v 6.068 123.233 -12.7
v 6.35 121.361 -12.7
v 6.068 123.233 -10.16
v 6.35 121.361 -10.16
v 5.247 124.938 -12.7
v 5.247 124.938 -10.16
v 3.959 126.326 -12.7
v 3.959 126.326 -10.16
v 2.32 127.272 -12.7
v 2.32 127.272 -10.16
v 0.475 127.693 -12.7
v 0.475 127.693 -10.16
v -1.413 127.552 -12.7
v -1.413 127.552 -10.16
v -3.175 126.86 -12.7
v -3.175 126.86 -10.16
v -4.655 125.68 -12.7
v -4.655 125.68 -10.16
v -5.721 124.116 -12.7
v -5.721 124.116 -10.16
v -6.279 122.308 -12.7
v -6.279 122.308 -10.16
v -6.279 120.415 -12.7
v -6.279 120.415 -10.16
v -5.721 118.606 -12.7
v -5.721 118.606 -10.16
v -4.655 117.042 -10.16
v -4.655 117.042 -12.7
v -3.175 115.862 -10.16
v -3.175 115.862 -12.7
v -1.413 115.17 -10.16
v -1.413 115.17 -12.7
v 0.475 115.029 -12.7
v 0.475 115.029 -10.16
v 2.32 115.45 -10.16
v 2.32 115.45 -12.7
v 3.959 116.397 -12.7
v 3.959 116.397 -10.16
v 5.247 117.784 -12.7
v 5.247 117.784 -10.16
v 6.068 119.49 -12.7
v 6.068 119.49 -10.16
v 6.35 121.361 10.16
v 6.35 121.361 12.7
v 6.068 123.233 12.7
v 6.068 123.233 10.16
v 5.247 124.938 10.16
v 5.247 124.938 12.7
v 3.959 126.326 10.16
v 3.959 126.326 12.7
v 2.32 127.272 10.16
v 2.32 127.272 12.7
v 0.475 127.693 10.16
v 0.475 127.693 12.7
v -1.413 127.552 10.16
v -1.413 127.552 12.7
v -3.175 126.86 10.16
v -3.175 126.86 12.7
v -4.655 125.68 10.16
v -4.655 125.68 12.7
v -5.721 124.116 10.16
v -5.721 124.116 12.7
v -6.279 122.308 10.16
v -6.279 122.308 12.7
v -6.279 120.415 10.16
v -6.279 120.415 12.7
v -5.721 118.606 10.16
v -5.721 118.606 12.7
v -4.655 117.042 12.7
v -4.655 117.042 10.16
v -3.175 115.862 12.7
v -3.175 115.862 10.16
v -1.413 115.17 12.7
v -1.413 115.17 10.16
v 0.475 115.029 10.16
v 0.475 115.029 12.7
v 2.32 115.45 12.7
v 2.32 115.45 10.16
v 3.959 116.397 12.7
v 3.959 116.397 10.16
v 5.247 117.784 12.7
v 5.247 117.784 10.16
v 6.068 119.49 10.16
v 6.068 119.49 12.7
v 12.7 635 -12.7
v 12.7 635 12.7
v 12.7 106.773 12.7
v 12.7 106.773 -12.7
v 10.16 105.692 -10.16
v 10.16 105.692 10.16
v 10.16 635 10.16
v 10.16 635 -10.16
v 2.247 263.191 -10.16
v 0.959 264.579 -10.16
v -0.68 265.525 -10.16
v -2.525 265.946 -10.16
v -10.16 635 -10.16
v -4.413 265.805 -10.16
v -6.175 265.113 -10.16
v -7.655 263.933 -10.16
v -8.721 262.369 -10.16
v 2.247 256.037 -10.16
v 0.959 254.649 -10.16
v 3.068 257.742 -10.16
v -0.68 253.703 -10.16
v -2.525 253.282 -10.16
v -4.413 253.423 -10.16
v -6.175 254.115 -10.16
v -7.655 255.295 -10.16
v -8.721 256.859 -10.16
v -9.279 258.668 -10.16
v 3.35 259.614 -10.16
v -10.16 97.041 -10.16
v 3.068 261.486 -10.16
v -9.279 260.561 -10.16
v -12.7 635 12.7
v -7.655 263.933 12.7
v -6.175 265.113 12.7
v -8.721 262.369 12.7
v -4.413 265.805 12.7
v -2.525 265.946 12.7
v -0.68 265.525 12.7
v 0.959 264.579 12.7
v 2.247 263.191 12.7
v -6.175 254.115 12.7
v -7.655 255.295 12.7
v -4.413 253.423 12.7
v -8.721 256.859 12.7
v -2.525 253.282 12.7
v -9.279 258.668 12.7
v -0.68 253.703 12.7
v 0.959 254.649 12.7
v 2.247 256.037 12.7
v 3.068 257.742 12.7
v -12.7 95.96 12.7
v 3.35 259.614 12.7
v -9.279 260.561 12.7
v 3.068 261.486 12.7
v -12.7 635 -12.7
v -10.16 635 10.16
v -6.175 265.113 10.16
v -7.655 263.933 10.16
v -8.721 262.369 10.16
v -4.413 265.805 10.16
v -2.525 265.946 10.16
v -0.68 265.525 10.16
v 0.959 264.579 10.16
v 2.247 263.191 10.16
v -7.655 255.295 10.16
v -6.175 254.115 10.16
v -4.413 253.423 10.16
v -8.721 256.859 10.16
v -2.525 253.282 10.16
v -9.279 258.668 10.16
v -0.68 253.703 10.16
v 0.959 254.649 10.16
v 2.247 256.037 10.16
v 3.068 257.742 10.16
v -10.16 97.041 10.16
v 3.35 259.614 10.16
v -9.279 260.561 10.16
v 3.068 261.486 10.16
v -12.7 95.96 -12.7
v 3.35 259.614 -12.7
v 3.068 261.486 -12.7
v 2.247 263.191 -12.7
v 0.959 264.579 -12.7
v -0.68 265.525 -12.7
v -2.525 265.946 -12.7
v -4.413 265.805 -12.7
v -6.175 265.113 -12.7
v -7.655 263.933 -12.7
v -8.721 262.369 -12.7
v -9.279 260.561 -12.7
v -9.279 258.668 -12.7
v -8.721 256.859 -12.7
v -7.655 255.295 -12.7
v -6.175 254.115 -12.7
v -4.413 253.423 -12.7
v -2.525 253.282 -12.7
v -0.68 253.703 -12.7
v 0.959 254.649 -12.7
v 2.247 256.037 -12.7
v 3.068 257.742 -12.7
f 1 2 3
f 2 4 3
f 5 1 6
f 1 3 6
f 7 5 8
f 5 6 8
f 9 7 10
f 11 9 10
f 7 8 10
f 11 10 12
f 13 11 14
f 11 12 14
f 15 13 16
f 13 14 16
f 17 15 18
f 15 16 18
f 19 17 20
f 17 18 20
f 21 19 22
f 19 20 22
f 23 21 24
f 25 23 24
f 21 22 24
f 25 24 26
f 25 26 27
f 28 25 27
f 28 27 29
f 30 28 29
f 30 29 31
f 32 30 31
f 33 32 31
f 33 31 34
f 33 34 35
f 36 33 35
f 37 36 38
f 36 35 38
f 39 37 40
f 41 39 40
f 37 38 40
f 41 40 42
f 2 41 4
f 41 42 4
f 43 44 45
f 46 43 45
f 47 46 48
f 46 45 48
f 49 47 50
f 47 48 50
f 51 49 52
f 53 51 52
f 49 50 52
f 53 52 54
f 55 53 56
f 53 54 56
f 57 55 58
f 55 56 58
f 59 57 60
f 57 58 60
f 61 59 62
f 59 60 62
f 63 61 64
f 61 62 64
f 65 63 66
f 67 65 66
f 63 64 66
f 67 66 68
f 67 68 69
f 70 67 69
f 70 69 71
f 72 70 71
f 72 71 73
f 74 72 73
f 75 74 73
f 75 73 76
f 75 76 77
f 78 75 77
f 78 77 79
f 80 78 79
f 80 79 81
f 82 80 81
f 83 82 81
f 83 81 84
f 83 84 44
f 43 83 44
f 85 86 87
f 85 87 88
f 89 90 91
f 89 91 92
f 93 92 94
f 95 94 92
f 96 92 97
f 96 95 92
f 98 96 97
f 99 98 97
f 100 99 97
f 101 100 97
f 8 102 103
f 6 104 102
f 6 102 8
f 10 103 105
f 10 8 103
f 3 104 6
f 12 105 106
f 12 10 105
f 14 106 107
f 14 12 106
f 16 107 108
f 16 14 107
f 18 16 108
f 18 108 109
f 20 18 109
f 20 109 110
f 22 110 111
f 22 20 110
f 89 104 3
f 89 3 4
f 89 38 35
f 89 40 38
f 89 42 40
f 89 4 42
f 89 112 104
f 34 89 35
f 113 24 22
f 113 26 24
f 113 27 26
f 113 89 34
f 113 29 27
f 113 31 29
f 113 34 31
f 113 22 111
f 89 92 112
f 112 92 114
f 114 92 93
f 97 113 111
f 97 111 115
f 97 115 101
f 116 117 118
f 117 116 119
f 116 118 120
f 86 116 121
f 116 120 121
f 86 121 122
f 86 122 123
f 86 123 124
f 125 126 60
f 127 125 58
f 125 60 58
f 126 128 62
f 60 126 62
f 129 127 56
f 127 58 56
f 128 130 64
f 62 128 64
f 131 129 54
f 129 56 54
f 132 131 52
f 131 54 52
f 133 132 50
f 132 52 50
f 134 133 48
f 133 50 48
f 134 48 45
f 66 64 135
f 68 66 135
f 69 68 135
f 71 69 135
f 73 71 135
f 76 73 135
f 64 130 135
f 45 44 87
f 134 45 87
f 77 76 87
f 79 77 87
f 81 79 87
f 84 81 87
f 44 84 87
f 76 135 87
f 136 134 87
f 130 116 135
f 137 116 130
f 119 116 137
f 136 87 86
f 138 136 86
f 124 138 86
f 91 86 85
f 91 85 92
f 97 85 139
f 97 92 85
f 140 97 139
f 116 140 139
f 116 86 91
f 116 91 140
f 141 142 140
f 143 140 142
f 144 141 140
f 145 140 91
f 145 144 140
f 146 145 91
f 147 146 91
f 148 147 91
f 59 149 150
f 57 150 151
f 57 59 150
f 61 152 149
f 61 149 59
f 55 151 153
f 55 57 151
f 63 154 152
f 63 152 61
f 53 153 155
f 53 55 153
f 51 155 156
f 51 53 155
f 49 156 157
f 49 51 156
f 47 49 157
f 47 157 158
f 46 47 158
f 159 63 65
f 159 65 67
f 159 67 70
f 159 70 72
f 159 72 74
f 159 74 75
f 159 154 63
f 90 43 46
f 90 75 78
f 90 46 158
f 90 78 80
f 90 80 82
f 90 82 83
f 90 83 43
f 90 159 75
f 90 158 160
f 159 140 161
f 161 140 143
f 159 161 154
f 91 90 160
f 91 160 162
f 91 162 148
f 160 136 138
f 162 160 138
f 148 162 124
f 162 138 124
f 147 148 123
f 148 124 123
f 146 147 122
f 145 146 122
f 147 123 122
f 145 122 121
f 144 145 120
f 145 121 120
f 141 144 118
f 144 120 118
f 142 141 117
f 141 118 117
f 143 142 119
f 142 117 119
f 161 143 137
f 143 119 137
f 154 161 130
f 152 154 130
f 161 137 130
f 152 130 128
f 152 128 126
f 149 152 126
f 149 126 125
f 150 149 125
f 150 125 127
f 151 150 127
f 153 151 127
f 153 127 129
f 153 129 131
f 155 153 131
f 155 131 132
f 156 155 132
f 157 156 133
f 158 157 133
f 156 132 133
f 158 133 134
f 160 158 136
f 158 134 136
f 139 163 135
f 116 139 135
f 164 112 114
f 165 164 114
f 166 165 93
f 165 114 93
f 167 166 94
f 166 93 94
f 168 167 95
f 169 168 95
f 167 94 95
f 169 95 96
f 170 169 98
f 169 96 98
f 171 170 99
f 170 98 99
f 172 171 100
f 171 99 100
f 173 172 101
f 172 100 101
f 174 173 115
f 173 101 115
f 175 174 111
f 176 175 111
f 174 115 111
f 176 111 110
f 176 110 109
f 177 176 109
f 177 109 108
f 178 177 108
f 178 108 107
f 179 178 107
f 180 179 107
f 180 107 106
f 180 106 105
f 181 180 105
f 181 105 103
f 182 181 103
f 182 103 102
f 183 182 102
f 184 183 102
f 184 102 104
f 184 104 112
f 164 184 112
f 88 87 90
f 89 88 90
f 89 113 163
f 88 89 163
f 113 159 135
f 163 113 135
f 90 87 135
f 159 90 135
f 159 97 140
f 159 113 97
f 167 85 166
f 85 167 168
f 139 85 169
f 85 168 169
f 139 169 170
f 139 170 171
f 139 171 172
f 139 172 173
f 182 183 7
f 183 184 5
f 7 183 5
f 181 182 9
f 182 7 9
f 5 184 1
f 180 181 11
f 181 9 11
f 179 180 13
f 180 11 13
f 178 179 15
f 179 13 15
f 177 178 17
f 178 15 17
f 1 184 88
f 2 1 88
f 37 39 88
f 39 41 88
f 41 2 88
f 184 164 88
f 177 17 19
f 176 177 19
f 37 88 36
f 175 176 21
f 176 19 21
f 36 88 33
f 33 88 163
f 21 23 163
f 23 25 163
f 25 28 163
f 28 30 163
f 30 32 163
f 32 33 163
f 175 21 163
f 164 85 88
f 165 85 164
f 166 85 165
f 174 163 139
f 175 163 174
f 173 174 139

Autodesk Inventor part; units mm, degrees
ref_plane "YZ Plane" through (0, 0, 0) normal (1, 0, 0) x (0, 1, 0)
ref_plane "XZ Plane" through (0, 0, 0) normal (0, 1, 0) x (-1, 0, 0)
ref_plane "XY Plane" through (0, 0, 0) normal (0, 0, 1) x (1, 0, 0)
sketch "Sketch1" plane through (0, 0, 0) normal (0, 1, 0) x (-1, 0, 0)
  line L0 (12.7, 12.7) -> (-12.7, 12.7)
  line L1 (-12.7, 12.7) -> (-12.7, -12.7)
  line L2 (-12.7, -12.7) -> (12.7, -12.7)
  line L3 (12.7, -12.7) -> (12.7, 12.7)
  line L4 (12.7, 12.7) -> (-12.7, -12.7) construction
  line L5 (-12.7, 12.7) -> (12.7, -12.7) construction
  line L6 (10.16, 10.16) -> (-10.16, 10.16)
  line L7 (-10.16, 10.16) -> (-10.16, -10.16)
  line L8 (-10.16, -10.16) -> (10.16, -10.16)
  line L9 (10.16, -10.16) -> (10.16, 10.16)
  point P0 (0, 0)
  dimension "d0" = 25.4
  dimension "d1" = 25.4
  dimension "d2" = 2.54
extrude "Extrusion1" add sketch "Sketch1" along normal blind 635
sketch "Sketch2" plane through (-12.7, 0, 12.7) normal (0, 0, 1) x (1, 0, 0)
  line L0 (-200.1642, 538.812) -> (-221.8597, 525.6033) construction
  line L1 (-221.8597, 525.6033) -> (42.3138, 91.695) construction
  line L2 (64.0092, 104.9037) -> (42.3138, 91.695) construction
  line L3 (-200.1642, 538.812) -> (64.0092, 104.9037) construction
  line L4 (0, 0) -> (25.4, 0) construction
  line L5 (25.4, 0) -> (25.4, 635)
  line L6 (0, 635) -> (25.4, 635) construction
  line L7 (0, 0) -> (0, 635) construction
  line L8 (-200.1642, 538.812) -> (-221.8597, 525.6033) construction
  line L9 (-221.8597, 525.6033) -> (42.3138, 91.695) construction
  line L10 (64.0092, 104.9037) -> (42.3138, 91.695) construction
  line L11 (-200.1642, 538.812) -> (64.0092, 104.9037) construction
  line L12 (25.4, 0) -> (25.4, 635) construction
  line L13 (0, 0) -> (0, 635) construction
  line L14 (0, 95.9598) -> (0, 0) construction
  line L15 (0, 0) -> (25.4, 0) construction
  line L16 (25.4, 0) -> (25.4, 106.7696) construction
  line L17 (22.86, 0) -> (22.86, 635) construction
  line L18 (25.4, 0) -> (25.4, 635) construction
  line L19 (25.4073, 106.776) -> (0, 95.9598)
  line L20 (0, 0) -> (0, 95.9598)
  line L21 (2.54, 0) -> (2.54, 635) projected
  line L22 (0, 0) -> (25.4, 0)
  line L23 (25.4, 0) -> (25.4073, 106.776)
  line L24 (25.4, 0) -> (25.4073, 0.0057)
  line L25 (25.4073, 0.0057) -> (25.4073, 106.776)
  circle A0 centre (46.5571, 109.1471) radius 6.35 projected
  circle A1 centre (46.5571, 109.1471) radius 6.35 projected
  point P0 (12.7, 0)
extrude "Extrusion2" cut sketch "Sketch2" against normal blind 128.5875 contours L22 L21 L19 L5 | L5 L19 L23 | L23 L25 L24 | L22 L20 L19 L21
sketch "Sketch4" plane through (-12.7, 635, 12.7) normal (0, 0, 1) x (1, 0, 0)
  circle A0 centre (46.5571, -525.8529) radius 6.35 projected
  point P0 (12.7, -635)
extrude "Extrusion3" cut sketch "Sketch4" against normal blind 128.5875
sketch "Sketch5" plane through (-12.7, 635, 12.7) normal (0, 0, 1) x (1, 0, 0)
  circle A0 centre (9.7002, -375.3859) radius 6.35 projected
  point P0 (12.7, -635)
extrude "Extrusion4" cut sketch "Sketch5" against normal through all
sketch "Sketch6" plane through (-12.7, 635, 12.7) normal (0, 0, 1) x (1, 0, 0)
  circle A0 centre (12.7, -513.6388) radius 6.35
  point P0 (12.7, -635)
  dimension "d11" = 12.7
extrude "Extrusion5" cut sketch "Sketch6" against normal through all
equation "\"BendRadius\" = Thickness"
equation "\"BendReliefWidth\" = Thickness"
equation "\"BendReliefDepth\" = 0.5 * Thickness"
equation "\"CornerReliefSize\" = 4 * Thickness"
equation "\"MinimumRemnant\" = 2 * Thickness"
equation "\"TransitionRadius\" = BendRadius"
equation "\"JacobiRadiusSize\" = BendRadius"
equation "\"GapSize\" = Thickness"
equation "\"Thickness\" = 3.048"
properties part number "conveyer frame" material "Aluminum 6061"
